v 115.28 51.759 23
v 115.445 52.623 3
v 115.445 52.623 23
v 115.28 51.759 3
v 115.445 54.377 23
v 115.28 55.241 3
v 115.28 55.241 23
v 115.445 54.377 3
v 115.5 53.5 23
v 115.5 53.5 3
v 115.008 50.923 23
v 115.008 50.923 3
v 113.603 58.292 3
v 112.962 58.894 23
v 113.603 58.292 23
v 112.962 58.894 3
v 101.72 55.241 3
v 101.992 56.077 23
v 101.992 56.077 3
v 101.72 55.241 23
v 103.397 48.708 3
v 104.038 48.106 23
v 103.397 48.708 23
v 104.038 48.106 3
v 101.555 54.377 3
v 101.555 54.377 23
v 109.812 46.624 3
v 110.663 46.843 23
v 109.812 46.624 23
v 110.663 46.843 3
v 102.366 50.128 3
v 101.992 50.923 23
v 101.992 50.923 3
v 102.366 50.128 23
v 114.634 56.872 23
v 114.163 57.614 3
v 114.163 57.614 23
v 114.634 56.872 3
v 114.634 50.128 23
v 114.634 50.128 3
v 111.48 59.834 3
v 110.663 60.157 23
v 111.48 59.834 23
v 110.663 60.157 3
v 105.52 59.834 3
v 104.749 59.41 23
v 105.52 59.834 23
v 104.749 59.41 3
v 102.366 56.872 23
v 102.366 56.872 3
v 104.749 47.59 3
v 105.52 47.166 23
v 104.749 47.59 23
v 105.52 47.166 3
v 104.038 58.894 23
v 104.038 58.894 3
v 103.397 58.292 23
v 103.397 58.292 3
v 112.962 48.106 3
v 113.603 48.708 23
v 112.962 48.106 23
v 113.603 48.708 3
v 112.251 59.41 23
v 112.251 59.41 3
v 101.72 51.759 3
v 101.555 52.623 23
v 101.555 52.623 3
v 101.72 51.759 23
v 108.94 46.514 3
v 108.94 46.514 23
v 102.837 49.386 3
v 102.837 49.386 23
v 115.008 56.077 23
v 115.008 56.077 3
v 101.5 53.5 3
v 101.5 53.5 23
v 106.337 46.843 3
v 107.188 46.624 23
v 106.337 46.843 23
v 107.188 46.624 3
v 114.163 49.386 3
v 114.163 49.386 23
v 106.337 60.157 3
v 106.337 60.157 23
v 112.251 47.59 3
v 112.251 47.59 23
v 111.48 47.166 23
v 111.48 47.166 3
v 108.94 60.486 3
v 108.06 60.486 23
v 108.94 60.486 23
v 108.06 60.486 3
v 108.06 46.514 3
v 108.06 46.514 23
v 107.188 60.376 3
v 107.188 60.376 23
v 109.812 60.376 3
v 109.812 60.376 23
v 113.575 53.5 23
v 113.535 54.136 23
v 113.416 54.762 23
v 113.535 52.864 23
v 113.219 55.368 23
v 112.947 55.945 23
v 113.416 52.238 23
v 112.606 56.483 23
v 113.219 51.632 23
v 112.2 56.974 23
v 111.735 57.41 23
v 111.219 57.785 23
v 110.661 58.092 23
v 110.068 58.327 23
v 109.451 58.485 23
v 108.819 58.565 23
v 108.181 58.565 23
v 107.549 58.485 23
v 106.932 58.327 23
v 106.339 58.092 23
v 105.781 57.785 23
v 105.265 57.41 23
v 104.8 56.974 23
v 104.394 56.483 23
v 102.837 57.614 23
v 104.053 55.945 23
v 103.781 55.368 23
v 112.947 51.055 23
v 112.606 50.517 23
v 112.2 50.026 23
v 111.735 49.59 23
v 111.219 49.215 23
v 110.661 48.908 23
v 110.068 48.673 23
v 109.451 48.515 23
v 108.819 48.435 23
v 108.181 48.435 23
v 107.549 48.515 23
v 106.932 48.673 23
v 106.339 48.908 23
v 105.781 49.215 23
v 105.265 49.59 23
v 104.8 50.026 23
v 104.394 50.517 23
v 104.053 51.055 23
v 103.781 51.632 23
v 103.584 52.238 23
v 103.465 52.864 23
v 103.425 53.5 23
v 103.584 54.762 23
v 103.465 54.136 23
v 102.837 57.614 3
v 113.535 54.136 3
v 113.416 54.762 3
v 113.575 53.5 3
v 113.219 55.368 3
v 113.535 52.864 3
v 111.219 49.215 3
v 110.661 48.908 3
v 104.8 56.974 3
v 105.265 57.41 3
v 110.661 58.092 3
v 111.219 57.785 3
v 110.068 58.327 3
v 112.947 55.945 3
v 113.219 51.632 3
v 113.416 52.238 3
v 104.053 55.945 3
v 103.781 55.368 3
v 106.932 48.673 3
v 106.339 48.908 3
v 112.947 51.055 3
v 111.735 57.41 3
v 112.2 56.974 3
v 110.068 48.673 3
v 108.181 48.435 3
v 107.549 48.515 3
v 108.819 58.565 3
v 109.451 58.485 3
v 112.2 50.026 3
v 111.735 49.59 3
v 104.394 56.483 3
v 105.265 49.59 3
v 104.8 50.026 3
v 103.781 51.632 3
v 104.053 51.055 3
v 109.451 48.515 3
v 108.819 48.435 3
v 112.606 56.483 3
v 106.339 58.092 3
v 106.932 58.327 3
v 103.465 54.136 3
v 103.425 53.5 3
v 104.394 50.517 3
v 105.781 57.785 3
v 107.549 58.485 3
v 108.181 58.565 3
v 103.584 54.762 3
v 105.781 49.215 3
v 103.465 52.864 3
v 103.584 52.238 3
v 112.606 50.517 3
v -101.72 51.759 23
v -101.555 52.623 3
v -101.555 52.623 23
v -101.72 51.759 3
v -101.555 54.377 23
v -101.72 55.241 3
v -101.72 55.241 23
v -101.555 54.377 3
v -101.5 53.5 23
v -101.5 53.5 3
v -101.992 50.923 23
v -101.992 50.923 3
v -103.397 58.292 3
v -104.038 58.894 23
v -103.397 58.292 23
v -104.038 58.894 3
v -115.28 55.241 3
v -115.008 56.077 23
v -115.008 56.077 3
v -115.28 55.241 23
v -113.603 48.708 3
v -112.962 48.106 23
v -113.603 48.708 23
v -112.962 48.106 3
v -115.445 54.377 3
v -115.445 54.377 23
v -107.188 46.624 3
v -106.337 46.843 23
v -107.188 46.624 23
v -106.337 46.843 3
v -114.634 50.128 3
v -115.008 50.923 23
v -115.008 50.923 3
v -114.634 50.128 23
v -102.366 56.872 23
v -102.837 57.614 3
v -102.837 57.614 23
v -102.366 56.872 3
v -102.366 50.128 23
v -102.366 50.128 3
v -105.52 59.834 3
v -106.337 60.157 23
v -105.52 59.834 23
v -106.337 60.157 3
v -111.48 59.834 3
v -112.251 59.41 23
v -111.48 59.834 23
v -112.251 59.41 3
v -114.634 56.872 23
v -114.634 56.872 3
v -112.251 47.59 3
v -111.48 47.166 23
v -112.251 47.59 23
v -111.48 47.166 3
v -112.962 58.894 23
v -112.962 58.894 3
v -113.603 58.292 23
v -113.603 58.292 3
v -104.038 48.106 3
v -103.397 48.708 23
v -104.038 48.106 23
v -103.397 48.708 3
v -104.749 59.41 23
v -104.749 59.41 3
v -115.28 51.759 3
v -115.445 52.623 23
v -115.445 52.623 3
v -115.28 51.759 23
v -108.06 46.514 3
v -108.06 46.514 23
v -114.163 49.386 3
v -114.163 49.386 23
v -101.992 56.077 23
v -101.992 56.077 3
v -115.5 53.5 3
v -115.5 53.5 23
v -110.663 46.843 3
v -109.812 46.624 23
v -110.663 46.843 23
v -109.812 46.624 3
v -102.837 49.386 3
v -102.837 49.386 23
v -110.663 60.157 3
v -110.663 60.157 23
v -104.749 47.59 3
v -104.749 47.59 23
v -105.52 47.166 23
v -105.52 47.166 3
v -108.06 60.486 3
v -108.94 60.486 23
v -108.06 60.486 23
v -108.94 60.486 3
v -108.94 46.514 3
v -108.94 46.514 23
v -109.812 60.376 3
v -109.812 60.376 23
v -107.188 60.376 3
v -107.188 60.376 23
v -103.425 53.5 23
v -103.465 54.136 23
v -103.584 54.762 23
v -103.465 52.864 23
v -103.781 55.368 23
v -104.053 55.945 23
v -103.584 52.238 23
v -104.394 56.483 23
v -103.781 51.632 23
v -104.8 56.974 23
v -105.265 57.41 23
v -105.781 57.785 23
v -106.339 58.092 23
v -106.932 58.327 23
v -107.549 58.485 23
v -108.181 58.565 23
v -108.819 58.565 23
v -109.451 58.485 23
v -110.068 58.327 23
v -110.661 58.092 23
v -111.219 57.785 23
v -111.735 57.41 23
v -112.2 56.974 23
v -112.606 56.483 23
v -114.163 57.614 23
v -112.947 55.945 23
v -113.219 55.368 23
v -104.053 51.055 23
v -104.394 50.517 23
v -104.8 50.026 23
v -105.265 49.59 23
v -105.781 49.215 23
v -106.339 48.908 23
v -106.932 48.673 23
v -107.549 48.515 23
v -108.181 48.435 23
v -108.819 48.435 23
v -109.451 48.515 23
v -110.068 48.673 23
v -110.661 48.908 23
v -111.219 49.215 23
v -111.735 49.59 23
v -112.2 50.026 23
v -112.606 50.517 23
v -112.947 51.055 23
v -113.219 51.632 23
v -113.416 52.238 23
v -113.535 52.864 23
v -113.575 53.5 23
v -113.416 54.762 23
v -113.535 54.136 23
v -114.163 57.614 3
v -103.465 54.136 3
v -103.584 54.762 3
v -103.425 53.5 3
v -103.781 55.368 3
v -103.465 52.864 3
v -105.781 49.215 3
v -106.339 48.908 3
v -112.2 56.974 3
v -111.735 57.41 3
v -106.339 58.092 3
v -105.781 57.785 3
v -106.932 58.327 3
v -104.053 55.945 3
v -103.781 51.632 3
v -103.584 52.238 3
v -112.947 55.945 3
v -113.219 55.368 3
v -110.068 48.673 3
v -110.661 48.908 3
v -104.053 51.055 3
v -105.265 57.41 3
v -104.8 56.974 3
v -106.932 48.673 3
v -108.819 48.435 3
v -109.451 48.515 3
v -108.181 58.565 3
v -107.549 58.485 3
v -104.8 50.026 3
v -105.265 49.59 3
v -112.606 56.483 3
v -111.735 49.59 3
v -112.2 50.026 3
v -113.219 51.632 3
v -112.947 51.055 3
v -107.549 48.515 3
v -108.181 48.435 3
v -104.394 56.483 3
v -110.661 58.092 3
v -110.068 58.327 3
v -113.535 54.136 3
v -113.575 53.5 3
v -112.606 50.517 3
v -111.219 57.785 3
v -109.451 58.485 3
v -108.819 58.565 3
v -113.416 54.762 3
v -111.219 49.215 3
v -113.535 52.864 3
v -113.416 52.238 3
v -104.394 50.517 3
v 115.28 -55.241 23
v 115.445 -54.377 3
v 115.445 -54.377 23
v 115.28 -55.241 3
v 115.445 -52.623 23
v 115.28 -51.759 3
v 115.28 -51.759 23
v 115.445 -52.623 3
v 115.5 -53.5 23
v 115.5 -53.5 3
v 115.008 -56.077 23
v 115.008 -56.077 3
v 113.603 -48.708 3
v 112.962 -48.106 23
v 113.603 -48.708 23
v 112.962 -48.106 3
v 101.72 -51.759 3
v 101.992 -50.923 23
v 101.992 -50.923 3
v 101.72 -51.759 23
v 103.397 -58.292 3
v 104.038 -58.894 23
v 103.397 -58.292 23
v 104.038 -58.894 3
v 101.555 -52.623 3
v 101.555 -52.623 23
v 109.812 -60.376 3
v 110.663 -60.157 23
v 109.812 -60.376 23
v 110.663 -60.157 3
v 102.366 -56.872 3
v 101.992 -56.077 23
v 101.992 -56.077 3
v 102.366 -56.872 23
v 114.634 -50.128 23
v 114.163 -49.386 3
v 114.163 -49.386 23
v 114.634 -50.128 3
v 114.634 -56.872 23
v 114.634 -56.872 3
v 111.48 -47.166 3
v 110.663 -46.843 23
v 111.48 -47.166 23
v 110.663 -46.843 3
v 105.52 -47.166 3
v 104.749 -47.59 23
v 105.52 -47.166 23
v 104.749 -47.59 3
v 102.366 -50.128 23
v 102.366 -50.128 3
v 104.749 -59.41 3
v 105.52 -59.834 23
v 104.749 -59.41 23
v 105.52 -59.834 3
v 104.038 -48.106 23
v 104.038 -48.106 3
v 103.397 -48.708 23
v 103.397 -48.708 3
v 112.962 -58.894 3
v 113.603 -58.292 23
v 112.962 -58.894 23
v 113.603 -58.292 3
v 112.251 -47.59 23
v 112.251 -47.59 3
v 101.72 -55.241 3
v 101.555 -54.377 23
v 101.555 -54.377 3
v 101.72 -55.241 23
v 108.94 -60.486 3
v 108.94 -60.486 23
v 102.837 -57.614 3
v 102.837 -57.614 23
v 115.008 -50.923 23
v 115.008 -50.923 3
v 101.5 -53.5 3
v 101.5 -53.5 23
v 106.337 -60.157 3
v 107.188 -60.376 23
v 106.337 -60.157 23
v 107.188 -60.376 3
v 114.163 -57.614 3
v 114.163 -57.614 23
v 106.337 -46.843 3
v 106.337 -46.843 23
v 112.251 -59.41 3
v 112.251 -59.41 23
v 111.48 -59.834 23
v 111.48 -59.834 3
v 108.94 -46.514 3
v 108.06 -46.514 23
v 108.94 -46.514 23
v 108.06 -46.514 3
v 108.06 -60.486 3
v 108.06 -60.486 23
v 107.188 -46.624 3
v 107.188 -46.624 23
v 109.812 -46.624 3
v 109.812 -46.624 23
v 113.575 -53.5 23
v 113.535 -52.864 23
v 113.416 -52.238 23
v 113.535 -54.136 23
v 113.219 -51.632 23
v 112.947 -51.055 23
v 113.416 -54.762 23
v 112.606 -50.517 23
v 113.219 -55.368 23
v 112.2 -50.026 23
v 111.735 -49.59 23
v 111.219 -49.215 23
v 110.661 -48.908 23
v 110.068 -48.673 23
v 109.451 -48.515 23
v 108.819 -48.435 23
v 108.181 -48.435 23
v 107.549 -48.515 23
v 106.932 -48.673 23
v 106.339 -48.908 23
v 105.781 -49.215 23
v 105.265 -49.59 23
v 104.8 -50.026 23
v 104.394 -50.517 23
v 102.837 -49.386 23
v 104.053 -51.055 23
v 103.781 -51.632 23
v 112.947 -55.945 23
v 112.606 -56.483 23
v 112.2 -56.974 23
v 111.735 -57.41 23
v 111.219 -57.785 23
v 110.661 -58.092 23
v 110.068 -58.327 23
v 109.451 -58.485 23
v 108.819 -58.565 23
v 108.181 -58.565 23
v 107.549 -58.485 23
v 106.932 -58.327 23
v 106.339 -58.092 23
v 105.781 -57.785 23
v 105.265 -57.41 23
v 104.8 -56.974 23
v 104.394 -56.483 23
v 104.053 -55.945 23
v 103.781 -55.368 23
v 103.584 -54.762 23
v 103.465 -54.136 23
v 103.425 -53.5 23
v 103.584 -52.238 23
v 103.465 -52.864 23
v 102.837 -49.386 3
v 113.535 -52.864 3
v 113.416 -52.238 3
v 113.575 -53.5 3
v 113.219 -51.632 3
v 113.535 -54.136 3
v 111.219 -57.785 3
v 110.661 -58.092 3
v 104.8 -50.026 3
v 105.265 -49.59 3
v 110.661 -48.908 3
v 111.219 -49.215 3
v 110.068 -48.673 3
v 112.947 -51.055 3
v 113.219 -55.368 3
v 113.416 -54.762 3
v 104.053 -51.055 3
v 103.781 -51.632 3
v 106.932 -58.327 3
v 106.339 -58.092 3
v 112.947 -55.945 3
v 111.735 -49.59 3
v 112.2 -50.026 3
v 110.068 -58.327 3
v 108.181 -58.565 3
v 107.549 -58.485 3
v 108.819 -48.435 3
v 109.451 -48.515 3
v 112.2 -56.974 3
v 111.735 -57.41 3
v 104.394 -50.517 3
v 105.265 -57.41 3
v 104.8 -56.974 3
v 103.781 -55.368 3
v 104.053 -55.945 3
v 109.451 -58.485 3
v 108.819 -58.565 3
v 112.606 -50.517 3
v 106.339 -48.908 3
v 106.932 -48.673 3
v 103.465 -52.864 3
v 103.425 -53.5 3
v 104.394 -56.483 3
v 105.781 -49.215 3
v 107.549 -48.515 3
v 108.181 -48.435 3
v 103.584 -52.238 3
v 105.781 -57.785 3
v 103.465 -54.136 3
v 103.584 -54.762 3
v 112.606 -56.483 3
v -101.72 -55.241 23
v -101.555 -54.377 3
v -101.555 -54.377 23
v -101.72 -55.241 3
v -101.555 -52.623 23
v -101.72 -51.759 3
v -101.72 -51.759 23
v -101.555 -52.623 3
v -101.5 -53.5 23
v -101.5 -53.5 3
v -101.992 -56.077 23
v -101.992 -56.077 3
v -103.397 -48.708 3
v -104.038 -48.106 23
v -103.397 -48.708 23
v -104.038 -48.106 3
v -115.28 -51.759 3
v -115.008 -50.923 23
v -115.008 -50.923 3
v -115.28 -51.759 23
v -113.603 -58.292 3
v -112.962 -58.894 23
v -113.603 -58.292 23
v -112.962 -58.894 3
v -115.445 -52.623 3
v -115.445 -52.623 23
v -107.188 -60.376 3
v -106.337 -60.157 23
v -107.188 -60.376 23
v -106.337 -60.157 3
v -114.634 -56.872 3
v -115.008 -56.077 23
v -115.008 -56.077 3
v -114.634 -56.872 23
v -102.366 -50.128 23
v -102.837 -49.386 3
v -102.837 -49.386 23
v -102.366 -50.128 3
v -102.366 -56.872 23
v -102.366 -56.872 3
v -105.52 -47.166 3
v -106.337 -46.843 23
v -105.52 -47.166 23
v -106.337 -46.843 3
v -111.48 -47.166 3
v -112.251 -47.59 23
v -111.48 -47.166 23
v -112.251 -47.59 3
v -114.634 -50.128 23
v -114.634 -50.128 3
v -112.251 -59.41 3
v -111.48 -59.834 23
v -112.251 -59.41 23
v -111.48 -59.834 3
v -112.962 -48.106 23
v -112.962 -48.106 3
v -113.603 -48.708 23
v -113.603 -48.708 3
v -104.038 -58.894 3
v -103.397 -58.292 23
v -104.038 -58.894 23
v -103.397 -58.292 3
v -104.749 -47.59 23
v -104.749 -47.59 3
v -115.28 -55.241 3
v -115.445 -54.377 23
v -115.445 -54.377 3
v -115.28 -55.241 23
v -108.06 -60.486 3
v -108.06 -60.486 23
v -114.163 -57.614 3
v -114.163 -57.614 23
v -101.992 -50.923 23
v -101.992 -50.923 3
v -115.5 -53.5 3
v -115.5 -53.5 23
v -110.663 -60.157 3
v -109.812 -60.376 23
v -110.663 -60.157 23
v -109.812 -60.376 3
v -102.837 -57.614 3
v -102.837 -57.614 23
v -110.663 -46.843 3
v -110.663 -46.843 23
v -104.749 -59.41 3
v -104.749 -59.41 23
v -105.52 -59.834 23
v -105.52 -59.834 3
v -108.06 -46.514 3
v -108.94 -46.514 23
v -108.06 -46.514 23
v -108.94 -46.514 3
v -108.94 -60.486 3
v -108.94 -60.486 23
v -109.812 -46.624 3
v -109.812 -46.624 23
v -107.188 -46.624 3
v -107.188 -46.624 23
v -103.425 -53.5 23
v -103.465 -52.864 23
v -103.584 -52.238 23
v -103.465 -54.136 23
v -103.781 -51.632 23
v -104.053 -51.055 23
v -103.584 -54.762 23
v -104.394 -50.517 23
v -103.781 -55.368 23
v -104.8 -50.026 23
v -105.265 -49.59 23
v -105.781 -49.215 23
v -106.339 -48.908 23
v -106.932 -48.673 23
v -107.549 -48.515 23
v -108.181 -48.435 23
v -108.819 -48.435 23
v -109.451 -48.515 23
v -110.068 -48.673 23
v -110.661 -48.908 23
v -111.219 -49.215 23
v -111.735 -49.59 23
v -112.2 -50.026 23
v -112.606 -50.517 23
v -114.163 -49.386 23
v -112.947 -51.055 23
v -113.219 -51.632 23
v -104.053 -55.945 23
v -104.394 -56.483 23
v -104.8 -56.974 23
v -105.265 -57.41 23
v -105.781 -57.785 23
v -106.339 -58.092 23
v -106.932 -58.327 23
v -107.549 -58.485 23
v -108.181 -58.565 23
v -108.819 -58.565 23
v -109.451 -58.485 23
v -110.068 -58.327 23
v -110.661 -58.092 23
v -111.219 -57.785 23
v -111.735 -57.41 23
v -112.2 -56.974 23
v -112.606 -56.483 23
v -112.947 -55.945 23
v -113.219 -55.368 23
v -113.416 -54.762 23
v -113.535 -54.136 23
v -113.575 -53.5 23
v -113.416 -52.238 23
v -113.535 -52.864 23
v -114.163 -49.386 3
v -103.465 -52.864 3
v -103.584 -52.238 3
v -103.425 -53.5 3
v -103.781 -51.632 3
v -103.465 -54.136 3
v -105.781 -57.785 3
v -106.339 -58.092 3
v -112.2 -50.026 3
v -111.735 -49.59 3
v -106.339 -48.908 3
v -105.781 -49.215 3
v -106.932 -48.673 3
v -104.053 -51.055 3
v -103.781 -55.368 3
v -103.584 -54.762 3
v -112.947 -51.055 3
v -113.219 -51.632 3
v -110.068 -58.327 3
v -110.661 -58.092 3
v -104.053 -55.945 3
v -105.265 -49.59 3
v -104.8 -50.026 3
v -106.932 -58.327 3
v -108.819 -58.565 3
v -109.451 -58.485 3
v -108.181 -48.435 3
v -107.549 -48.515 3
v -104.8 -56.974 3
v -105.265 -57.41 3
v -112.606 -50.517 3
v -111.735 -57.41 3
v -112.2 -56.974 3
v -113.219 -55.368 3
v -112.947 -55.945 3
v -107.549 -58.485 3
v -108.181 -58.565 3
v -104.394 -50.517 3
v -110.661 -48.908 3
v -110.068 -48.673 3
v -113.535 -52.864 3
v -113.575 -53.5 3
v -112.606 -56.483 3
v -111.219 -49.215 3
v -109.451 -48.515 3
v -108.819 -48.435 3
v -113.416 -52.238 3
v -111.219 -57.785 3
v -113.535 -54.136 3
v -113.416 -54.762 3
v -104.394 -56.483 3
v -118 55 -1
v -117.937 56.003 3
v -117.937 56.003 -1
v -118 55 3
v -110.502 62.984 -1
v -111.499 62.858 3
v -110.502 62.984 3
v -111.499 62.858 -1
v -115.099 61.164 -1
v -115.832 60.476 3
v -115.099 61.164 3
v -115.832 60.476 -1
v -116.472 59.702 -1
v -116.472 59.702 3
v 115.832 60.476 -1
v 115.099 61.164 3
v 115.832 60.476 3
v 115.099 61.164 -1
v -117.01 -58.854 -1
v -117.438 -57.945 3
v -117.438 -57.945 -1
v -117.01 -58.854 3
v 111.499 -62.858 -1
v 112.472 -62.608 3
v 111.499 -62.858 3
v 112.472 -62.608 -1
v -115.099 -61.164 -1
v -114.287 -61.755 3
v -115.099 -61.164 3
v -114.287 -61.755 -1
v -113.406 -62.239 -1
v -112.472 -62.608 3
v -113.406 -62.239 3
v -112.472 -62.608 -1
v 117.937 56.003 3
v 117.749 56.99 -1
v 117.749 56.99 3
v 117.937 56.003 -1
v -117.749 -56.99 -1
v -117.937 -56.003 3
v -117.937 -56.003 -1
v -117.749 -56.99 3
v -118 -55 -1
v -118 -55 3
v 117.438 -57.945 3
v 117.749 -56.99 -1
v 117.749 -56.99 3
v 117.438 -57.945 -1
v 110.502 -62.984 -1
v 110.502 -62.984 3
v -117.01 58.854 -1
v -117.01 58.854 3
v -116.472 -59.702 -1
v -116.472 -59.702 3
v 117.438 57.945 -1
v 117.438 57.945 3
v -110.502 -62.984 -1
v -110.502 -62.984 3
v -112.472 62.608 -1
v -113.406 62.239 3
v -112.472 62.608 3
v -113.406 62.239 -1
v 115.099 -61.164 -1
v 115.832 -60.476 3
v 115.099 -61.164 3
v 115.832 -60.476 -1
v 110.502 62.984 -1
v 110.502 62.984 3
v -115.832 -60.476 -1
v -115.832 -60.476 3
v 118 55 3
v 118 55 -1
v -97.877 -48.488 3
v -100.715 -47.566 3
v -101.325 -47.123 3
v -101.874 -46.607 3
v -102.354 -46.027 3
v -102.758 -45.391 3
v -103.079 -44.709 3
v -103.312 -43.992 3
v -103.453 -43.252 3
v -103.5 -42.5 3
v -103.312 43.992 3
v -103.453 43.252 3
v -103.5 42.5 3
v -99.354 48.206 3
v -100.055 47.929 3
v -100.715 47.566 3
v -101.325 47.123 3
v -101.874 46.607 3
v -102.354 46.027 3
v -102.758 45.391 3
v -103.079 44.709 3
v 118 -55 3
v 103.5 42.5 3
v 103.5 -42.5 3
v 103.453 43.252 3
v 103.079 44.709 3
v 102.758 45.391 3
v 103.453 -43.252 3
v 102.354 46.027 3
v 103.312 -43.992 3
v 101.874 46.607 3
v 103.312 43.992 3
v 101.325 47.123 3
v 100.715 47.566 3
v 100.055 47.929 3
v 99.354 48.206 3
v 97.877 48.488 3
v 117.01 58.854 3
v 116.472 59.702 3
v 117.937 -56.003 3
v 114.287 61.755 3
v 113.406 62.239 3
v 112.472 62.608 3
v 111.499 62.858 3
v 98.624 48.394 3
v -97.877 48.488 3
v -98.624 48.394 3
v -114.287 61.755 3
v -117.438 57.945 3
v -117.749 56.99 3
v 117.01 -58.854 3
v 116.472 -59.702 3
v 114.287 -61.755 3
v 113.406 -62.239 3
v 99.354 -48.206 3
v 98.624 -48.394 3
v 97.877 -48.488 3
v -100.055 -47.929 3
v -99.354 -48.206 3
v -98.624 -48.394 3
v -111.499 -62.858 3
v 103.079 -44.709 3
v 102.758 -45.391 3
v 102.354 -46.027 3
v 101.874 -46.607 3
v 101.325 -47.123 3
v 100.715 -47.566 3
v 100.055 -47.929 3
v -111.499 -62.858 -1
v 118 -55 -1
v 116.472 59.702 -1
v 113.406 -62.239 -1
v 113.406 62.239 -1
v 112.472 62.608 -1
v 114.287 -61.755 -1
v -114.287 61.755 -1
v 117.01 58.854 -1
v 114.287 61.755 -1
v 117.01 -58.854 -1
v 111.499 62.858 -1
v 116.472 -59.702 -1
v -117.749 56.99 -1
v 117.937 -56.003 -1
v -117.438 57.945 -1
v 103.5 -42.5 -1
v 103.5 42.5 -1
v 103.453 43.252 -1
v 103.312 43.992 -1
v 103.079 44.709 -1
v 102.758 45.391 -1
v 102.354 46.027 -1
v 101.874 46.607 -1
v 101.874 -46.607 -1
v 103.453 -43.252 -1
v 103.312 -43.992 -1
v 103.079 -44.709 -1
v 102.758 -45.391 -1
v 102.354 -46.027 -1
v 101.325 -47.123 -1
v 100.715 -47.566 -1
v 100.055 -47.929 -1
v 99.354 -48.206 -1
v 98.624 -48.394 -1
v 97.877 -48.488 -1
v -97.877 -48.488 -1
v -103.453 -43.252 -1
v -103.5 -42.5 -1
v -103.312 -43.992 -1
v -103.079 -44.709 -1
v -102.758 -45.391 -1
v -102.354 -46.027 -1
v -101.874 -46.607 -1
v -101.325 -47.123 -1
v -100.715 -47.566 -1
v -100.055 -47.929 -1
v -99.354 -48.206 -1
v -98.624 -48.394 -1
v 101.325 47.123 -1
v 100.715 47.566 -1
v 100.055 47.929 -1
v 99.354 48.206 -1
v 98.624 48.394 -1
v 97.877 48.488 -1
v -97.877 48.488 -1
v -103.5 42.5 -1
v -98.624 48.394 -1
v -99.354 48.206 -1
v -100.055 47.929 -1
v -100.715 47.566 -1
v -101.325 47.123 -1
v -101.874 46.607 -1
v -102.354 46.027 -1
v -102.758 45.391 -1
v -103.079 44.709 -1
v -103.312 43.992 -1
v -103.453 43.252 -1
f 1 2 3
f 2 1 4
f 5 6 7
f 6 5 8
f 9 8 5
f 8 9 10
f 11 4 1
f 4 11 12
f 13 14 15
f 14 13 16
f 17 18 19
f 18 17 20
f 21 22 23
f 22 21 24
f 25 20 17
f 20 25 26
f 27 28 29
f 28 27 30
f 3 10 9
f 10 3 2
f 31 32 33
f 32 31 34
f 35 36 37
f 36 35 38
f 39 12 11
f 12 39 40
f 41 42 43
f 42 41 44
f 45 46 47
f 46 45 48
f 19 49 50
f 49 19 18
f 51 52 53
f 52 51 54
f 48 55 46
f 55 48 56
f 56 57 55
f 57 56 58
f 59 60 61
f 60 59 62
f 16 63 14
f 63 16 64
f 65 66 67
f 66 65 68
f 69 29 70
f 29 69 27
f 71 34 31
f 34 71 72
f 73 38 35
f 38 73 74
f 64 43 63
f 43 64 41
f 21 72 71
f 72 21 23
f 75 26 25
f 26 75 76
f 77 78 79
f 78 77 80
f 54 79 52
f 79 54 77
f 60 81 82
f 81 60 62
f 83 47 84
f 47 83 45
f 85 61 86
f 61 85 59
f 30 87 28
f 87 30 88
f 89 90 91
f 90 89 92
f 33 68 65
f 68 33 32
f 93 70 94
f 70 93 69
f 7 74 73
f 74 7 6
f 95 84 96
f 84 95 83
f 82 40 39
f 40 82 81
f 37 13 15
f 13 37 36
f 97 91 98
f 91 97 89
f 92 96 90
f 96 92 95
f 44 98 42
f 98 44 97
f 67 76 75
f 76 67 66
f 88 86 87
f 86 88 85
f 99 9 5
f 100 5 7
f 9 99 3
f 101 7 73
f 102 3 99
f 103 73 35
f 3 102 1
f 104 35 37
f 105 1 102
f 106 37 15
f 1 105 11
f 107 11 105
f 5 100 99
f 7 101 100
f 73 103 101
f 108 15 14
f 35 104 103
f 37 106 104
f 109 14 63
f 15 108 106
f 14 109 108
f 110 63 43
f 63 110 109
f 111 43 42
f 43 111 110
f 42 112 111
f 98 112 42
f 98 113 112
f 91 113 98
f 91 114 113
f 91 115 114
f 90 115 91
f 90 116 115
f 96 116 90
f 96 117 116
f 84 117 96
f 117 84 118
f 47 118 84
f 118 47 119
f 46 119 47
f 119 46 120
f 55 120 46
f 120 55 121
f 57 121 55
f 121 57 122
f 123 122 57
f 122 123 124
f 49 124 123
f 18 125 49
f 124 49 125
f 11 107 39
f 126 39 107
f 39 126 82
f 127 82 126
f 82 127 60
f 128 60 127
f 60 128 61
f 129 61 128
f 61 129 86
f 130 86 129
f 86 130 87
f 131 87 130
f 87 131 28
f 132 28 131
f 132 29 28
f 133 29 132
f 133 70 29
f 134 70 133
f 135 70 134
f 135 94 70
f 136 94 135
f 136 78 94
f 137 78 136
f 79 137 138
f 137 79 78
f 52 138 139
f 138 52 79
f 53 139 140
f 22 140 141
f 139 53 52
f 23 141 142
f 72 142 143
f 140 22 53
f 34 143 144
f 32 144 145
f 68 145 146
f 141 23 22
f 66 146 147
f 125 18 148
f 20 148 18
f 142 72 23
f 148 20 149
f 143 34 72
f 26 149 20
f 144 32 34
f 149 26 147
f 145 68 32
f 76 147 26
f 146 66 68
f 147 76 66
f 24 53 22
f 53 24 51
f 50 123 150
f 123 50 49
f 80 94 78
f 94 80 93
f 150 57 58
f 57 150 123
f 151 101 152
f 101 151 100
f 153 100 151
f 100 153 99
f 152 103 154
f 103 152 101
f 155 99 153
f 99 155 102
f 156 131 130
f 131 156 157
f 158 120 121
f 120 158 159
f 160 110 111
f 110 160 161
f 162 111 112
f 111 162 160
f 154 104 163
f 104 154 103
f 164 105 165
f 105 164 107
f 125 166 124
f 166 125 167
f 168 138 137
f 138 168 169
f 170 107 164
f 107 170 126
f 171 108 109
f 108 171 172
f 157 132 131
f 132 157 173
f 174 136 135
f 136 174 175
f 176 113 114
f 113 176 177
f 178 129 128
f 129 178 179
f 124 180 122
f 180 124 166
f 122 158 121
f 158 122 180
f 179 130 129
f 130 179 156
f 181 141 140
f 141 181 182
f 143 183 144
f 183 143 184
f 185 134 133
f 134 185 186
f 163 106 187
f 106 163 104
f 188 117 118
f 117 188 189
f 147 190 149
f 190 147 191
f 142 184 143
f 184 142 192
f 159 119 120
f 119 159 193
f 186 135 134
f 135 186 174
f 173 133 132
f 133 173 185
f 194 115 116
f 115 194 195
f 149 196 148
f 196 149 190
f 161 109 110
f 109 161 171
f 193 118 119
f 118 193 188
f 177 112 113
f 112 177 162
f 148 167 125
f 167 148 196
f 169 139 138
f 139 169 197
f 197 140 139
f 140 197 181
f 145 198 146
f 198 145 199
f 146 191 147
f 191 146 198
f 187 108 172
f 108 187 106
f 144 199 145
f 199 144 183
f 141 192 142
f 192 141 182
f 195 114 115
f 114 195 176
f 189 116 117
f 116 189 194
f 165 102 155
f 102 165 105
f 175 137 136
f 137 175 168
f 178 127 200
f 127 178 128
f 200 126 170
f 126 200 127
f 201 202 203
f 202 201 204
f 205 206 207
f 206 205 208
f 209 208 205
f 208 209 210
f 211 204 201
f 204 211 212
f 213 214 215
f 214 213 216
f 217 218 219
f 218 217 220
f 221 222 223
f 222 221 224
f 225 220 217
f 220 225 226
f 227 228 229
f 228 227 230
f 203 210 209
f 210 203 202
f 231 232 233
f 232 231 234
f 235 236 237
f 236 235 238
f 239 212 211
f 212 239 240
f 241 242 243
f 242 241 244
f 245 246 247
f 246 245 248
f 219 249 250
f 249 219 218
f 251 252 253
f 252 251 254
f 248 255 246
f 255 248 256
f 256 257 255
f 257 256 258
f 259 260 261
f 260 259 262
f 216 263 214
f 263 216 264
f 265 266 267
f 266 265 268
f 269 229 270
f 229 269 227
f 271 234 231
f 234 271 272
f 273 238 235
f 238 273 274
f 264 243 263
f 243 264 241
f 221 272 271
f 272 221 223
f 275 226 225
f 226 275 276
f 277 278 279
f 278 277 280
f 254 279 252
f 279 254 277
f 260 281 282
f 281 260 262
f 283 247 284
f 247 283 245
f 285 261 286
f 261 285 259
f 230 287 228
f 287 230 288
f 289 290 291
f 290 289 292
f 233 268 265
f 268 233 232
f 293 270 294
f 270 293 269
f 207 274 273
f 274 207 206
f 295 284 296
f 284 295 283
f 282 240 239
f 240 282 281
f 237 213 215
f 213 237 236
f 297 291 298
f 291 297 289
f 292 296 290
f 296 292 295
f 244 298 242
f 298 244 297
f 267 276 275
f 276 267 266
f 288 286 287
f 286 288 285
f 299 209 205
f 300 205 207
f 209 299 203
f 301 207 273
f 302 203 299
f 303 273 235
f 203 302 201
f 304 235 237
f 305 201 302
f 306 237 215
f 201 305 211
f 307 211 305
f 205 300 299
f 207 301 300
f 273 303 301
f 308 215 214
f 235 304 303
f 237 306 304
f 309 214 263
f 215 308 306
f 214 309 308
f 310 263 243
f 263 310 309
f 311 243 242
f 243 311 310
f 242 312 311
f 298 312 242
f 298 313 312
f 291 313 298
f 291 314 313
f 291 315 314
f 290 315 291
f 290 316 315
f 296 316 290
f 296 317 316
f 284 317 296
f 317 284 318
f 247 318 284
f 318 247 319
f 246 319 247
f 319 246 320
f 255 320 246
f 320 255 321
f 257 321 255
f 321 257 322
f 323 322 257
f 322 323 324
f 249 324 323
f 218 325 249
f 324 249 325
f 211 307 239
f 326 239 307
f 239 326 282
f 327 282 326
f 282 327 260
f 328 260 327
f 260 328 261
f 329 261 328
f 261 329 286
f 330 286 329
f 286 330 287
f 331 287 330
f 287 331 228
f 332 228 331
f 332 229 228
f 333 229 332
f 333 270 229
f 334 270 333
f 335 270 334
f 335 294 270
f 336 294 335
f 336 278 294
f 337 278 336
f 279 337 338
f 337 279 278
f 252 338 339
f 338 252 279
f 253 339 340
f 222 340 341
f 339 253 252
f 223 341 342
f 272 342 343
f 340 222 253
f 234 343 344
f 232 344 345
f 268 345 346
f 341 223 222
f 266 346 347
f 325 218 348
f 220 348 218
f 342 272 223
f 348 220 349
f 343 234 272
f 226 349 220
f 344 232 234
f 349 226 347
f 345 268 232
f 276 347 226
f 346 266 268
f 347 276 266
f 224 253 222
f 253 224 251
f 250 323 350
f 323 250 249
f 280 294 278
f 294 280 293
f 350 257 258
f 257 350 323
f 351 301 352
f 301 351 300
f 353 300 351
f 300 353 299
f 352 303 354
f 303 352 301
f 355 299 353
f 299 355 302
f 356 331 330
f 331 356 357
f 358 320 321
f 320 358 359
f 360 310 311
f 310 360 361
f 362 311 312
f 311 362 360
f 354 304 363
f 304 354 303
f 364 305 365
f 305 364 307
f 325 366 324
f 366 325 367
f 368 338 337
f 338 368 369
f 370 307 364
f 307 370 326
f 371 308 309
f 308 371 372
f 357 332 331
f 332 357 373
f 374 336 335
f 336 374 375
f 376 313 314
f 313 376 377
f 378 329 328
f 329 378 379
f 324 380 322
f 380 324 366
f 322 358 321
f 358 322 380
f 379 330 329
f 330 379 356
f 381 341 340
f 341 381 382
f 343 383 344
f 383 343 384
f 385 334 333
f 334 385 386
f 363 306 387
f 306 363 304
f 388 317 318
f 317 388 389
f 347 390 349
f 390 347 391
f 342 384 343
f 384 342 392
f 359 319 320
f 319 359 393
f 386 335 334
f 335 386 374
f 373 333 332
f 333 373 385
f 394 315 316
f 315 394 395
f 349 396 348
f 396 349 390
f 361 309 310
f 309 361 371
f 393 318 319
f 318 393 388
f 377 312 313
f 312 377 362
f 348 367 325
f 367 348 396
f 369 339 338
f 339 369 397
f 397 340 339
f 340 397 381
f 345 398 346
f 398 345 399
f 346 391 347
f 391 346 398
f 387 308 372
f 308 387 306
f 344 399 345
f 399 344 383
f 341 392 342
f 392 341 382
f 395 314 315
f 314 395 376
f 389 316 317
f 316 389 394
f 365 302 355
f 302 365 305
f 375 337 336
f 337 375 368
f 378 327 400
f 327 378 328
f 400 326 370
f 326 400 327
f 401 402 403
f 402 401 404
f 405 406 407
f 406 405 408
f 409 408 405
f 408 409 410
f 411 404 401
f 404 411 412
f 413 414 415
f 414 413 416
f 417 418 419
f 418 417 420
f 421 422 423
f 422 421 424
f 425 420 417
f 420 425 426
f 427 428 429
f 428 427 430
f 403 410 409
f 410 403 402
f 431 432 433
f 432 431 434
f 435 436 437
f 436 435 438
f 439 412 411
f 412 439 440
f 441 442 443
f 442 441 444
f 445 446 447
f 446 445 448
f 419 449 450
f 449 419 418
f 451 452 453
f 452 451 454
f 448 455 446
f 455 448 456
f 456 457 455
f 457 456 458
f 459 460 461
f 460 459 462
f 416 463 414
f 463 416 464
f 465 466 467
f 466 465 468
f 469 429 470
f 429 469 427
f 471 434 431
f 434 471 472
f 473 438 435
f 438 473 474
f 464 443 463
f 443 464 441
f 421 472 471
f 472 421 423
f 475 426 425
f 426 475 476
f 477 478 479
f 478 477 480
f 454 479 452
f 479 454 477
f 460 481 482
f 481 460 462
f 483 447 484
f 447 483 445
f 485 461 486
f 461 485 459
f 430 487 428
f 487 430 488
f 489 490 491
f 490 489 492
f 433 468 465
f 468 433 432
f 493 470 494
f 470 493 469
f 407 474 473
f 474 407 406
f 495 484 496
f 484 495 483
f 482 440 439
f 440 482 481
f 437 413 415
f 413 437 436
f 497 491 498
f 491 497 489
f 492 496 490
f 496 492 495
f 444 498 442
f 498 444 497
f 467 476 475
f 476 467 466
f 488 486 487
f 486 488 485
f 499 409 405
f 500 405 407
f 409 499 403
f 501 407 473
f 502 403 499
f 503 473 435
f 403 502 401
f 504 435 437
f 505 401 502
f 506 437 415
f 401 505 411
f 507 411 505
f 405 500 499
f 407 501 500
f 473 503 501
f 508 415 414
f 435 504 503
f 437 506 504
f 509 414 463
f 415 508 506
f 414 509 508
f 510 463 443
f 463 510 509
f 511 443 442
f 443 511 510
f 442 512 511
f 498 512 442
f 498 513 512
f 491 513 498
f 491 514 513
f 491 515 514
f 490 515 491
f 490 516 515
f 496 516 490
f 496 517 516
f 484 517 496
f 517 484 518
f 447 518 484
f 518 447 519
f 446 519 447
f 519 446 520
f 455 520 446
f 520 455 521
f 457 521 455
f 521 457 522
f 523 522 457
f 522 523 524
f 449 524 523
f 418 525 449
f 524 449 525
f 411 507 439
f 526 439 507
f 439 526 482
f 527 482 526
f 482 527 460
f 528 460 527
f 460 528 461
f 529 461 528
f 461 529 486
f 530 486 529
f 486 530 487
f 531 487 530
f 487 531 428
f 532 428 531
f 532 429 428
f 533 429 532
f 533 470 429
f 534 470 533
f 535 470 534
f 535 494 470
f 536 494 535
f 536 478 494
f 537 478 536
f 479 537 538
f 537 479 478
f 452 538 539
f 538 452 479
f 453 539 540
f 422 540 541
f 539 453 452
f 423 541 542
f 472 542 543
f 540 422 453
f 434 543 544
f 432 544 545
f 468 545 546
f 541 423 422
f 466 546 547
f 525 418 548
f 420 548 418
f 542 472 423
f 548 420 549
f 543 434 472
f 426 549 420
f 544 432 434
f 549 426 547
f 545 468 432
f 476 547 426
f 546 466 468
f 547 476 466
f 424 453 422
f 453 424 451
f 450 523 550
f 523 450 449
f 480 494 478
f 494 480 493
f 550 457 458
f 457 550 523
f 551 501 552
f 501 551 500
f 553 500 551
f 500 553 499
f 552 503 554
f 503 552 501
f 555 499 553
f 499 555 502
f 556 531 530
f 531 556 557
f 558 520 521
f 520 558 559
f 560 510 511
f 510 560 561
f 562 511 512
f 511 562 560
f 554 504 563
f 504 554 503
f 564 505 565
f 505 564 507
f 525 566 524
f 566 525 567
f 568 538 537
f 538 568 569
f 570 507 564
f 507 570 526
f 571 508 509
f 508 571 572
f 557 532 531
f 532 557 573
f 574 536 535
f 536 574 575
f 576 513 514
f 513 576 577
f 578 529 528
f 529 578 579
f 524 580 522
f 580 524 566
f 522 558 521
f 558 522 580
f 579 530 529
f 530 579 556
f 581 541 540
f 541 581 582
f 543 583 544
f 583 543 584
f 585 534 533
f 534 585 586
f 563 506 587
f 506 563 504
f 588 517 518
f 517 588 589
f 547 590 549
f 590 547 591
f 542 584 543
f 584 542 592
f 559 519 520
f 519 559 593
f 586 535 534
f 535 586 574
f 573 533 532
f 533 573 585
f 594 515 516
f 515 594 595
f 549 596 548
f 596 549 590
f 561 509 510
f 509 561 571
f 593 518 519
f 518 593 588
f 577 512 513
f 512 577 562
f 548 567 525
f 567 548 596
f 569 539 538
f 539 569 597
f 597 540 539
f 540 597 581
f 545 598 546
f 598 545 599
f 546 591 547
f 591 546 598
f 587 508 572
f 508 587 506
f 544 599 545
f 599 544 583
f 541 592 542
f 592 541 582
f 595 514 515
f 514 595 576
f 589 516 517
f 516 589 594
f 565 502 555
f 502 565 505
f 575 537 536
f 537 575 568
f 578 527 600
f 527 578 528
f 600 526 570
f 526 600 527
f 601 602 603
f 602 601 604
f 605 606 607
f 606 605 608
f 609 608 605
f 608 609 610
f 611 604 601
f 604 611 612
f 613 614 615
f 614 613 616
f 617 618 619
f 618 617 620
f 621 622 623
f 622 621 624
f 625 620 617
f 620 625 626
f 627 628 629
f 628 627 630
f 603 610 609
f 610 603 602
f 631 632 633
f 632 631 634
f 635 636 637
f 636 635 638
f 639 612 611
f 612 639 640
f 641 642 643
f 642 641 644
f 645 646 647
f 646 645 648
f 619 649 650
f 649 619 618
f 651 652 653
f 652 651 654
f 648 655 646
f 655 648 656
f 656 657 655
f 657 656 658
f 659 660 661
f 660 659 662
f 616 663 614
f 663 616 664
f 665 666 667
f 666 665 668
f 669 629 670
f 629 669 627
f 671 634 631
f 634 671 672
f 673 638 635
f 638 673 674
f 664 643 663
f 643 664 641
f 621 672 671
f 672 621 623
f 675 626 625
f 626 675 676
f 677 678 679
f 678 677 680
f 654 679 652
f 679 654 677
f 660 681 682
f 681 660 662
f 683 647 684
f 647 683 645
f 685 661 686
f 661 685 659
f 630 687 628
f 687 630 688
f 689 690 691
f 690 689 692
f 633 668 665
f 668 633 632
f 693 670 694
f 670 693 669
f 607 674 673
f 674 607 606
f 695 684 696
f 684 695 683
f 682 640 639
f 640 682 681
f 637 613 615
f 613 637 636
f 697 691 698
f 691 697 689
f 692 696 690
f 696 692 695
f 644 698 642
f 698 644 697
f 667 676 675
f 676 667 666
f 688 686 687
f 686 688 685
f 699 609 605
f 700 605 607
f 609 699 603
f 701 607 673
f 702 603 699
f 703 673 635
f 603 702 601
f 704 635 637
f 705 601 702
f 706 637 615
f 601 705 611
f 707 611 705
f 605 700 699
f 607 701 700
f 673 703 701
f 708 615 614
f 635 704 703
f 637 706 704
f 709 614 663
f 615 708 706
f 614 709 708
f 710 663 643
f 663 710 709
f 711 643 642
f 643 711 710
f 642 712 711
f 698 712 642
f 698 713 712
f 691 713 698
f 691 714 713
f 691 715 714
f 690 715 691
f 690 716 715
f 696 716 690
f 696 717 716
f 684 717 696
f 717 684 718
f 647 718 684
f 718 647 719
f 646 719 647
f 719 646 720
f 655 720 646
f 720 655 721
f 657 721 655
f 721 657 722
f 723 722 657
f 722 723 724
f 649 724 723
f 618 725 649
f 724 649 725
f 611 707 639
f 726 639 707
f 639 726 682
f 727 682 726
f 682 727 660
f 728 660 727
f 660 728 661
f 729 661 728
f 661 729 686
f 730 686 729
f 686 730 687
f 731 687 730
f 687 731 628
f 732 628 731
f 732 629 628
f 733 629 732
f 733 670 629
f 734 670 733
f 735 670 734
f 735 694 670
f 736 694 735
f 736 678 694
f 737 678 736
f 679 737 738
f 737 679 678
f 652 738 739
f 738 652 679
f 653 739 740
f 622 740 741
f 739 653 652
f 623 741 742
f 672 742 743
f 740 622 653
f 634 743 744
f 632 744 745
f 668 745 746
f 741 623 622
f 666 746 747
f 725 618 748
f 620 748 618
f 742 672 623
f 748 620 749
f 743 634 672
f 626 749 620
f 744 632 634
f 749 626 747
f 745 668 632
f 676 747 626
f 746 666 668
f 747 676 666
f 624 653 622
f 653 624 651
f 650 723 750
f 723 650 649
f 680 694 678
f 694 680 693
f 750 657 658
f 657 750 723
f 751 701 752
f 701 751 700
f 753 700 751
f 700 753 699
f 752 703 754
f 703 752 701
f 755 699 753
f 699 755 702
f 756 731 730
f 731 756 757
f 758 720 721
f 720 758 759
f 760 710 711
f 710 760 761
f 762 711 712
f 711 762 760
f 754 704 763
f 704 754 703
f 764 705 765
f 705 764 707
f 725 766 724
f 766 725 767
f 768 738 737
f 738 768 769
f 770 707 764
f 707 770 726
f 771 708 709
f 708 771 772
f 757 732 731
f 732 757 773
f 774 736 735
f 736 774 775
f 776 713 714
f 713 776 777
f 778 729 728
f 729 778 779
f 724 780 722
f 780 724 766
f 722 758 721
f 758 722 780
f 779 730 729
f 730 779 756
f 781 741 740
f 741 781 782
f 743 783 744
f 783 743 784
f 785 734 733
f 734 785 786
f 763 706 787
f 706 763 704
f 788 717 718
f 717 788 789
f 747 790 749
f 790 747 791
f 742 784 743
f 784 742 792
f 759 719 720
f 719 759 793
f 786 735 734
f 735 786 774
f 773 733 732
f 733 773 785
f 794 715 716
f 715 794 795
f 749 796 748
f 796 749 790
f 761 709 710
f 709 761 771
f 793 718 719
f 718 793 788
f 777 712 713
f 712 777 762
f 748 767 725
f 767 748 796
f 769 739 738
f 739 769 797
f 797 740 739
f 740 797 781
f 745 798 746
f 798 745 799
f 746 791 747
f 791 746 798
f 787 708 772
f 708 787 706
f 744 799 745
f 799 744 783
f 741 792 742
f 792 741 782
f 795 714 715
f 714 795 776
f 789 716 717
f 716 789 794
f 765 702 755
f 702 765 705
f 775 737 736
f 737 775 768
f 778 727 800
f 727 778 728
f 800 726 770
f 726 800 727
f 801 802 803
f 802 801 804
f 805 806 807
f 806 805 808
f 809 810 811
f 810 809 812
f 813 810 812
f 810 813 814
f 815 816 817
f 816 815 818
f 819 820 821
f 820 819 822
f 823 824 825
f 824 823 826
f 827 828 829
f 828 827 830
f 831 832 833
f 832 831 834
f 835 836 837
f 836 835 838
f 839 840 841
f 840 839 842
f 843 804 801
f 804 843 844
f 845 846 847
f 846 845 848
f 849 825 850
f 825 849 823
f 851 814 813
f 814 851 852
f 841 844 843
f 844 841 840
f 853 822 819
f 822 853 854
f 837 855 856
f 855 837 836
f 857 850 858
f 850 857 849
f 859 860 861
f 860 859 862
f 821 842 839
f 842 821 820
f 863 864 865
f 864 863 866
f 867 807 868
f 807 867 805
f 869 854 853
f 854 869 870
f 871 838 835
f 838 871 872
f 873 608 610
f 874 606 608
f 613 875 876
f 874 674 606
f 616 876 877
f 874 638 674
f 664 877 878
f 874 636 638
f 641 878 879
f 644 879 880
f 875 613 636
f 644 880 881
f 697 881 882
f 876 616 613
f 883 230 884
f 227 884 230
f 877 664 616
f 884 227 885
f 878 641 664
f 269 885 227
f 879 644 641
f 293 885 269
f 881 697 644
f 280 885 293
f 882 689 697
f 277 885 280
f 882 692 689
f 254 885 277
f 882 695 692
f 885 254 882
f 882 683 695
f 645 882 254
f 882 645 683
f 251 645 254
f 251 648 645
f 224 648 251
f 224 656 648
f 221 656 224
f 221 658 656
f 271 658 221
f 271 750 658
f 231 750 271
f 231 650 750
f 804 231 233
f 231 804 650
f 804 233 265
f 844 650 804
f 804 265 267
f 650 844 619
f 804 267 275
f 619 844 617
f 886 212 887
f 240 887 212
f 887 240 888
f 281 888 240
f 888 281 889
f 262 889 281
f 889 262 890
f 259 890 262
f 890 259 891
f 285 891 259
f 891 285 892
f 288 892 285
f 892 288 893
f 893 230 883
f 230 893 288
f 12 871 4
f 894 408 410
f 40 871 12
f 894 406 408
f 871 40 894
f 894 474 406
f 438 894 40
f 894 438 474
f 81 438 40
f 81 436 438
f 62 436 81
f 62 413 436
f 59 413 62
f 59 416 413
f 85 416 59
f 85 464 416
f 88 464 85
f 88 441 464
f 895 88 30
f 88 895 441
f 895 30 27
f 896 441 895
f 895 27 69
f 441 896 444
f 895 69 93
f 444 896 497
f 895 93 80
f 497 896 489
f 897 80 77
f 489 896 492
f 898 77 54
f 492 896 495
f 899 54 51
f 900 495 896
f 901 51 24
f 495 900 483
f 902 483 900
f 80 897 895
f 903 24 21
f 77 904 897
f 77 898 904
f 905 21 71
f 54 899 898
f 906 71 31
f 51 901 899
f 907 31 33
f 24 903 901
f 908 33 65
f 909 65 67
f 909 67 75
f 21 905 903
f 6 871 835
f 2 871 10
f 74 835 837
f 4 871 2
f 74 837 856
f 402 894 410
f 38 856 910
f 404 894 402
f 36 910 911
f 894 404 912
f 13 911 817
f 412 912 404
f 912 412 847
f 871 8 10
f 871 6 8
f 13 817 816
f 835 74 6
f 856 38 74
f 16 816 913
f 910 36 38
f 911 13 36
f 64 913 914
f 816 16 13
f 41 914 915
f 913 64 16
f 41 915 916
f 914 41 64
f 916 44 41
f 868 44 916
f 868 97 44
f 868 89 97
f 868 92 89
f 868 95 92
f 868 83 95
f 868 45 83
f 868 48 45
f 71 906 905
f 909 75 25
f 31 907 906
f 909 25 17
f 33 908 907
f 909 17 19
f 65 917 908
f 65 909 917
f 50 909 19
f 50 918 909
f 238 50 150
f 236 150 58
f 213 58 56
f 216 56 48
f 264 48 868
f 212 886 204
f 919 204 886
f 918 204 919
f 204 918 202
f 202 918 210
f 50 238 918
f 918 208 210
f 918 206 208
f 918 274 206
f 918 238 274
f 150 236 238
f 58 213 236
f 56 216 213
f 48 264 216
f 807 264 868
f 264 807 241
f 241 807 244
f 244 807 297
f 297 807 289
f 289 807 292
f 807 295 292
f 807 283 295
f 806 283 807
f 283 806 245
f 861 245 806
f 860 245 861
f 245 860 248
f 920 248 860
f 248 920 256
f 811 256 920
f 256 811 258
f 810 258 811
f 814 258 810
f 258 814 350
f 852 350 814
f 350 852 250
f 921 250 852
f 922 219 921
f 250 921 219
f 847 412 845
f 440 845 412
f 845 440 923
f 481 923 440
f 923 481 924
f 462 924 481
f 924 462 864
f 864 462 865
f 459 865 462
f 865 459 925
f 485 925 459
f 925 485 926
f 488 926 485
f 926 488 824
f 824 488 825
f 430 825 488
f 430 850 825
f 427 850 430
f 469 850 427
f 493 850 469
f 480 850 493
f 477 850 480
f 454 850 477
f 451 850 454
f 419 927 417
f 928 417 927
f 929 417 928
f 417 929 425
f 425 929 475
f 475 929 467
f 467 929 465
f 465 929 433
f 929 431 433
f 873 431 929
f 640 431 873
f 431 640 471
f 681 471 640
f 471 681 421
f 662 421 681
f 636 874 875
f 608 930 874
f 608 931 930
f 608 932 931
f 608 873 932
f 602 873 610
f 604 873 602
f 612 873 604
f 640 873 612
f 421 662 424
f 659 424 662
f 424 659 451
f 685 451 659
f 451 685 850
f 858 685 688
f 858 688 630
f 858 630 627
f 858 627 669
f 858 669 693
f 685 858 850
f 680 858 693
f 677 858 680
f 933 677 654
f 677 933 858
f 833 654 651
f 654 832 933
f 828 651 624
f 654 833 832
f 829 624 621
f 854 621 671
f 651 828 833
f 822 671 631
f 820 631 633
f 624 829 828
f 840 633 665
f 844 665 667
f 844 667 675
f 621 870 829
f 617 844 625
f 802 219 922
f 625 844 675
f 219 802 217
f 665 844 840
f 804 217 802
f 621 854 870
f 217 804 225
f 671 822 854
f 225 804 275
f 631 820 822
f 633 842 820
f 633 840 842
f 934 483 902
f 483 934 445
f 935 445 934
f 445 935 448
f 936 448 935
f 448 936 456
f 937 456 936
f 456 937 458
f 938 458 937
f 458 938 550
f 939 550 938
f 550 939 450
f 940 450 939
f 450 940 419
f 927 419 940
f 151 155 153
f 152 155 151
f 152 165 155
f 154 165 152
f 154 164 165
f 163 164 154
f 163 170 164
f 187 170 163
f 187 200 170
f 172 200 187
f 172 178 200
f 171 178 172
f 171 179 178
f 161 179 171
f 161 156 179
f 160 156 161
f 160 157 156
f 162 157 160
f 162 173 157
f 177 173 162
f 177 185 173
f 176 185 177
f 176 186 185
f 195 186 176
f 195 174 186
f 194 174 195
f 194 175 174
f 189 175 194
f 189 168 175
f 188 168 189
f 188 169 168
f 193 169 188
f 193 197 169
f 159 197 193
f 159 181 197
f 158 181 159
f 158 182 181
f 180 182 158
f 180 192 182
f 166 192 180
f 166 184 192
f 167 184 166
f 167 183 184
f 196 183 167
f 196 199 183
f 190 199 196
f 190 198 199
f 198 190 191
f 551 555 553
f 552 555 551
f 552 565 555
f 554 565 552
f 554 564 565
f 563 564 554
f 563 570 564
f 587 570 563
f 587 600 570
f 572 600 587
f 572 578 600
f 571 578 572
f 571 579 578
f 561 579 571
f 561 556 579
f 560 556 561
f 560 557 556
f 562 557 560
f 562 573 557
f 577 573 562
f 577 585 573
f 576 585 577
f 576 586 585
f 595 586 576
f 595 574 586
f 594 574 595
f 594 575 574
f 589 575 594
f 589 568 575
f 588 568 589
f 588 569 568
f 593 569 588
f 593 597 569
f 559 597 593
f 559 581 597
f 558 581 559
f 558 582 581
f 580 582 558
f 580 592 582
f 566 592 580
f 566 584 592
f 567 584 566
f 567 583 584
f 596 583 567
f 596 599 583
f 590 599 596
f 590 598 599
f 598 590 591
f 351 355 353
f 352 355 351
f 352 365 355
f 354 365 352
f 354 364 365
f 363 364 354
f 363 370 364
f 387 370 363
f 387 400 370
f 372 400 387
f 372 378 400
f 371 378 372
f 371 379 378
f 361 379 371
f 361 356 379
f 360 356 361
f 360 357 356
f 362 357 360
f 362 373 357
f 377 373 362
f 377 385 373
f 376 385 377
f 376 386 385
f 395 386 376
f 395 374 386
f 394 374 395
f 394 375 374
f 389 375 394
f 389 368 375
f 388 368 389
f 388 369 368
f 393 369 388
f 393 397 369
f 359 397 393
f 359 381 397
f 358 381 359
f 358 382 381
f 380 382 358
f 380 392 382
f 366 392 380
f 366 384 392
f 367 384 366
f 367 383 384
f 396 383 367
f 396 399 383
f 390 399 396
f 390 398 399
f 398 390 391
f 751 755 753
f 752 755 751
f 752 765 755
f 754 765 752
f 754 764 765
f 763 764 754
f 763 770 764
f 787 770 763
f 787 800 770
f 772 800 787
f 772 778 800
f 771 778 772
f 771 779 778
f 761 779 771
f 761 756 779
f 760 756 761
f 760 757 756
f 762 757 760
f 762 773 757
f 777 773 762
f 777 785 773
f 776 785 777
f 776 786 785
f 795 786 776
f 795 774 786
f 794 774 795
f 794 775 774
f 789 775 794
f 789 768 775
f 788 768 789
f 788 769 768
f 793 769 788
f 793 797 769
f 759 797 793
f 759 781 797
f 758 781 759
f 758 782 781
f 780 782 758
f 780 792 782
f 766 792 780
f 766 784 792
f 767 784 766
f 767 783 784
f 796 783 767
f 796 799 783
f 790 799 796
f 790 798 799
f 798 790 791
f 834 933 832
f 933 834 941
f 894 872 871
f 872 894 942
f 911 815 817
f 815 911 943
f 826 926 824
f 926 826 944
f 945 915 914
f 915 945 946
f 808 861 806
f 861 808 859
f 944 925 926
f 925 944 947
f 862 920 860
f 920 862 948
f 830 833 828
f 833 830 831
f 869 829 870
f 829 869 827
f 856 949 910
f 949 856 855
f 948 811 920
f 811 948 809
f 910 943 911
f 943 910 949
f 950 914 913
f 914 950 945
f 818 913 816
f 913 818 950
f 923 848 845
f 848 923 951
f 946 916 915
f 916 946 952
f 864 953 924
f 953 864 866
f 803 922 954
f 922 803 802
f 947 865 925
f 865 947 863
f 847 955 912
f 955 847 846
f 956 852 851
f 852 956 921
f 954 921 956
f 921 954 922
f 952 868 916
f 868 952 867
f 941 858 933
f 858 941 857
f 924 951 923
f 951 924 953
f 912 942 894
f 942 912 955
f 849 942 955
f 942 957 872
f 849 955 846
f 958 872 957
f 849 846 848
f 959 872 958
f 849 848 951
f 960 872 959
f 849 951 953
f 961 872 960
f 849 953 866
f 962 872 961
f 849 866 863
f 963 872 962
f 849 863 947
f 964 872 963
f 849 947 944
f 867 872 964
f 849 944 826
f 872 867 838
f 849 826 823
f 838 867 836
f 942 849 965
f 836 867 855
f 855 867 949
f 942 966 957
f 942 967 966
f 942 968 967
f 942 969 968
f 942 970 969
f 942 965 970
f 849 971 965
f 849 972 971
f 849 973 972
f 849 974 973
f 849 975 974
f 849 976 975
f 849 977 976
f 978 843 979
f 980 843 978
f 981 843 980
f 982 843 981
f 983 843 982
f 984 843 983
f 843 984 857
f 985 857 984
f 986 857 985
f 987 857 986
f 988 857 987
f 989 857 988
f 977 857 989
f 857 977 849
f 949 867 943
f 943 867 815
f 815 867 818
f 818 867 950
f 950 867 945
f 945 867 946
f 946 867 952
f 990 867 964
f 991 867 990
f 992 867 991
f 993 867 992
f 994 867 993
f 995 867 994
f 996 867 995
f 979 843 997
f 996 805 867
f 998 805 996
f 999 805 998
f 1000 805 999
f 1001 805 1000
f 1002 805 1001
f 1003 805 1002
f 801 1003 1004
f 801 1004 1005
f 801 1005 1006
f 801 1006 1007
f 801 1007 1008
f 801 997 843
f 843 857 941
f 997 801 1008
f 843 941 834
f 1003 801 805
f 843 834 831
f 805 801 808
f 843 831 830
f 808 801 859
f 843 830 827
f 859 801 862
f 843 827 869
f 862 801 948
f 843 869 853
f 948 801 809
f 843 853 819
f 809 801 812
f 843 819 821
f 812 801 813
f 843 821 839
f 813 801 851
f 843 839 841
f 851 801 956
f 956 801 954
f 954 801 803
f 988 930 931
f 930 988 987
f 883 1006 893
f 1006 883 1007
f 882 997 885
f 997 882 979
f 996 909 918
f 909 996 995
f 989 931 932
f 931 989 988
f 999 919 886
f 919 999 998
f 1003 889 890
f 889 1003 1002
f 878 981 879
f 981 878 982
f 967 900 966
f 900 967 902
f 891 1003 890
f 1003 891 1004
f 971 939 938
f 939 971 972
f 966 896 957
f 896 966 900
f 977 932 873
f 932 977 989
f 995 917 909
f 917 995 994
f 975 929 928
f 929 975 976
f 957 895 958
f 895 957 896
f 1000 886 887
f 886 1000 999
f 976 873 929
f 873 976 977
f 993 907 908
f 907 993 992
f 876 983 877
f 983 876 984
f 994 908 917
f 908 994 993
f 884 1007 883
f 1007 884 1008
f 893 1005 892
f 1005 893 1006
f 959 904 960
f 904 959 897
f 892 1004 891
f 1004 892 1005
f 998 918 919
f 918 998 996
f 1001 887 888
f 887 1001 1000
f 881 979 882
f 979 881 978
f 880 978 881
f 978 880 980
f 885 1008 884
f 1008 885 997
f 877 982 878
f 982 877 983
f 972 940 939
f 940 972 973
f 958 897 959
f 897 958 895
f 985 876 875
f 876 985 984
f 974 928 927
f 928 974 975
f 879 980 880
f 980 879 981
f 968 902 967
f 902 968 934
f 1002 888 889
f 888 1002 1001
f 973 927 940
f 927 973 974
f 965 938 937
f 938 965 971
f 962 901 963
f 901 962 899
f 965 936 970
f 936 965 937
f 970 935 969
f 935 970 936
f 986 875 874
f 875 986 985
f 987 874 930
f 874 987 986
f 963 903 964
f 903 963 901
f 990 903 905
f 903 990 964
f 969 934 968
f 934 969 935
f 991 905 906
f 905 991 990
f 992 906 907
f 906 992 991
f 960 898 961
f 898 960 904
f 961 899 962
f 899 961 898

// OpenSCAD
$fn =50;

module hole() { 
    translate([0,0,12]) {
        difference() {
            cylinder(h=22,d=14,center=true);
            cylinder(h=22,d=10.15,center=true);
        }
    }
}

w = 108.5;
h = 53.5;

translate([w,h,0]) {
    hole();
}
translate([-w,h,0]) {
    hole();
}
translate([w,-h,0]) {
    hole();
}
translate([-w,-h,0]) {
    hole();
}

difference() {
    minkowski()
    {
      cube([220,110,2], center=true);
      cylinder(r=8,h=2);
    }
    minkowski()
    {
      cube([195,85,2], center=true);
      cylinder(r=6,h=2);
    }
}
